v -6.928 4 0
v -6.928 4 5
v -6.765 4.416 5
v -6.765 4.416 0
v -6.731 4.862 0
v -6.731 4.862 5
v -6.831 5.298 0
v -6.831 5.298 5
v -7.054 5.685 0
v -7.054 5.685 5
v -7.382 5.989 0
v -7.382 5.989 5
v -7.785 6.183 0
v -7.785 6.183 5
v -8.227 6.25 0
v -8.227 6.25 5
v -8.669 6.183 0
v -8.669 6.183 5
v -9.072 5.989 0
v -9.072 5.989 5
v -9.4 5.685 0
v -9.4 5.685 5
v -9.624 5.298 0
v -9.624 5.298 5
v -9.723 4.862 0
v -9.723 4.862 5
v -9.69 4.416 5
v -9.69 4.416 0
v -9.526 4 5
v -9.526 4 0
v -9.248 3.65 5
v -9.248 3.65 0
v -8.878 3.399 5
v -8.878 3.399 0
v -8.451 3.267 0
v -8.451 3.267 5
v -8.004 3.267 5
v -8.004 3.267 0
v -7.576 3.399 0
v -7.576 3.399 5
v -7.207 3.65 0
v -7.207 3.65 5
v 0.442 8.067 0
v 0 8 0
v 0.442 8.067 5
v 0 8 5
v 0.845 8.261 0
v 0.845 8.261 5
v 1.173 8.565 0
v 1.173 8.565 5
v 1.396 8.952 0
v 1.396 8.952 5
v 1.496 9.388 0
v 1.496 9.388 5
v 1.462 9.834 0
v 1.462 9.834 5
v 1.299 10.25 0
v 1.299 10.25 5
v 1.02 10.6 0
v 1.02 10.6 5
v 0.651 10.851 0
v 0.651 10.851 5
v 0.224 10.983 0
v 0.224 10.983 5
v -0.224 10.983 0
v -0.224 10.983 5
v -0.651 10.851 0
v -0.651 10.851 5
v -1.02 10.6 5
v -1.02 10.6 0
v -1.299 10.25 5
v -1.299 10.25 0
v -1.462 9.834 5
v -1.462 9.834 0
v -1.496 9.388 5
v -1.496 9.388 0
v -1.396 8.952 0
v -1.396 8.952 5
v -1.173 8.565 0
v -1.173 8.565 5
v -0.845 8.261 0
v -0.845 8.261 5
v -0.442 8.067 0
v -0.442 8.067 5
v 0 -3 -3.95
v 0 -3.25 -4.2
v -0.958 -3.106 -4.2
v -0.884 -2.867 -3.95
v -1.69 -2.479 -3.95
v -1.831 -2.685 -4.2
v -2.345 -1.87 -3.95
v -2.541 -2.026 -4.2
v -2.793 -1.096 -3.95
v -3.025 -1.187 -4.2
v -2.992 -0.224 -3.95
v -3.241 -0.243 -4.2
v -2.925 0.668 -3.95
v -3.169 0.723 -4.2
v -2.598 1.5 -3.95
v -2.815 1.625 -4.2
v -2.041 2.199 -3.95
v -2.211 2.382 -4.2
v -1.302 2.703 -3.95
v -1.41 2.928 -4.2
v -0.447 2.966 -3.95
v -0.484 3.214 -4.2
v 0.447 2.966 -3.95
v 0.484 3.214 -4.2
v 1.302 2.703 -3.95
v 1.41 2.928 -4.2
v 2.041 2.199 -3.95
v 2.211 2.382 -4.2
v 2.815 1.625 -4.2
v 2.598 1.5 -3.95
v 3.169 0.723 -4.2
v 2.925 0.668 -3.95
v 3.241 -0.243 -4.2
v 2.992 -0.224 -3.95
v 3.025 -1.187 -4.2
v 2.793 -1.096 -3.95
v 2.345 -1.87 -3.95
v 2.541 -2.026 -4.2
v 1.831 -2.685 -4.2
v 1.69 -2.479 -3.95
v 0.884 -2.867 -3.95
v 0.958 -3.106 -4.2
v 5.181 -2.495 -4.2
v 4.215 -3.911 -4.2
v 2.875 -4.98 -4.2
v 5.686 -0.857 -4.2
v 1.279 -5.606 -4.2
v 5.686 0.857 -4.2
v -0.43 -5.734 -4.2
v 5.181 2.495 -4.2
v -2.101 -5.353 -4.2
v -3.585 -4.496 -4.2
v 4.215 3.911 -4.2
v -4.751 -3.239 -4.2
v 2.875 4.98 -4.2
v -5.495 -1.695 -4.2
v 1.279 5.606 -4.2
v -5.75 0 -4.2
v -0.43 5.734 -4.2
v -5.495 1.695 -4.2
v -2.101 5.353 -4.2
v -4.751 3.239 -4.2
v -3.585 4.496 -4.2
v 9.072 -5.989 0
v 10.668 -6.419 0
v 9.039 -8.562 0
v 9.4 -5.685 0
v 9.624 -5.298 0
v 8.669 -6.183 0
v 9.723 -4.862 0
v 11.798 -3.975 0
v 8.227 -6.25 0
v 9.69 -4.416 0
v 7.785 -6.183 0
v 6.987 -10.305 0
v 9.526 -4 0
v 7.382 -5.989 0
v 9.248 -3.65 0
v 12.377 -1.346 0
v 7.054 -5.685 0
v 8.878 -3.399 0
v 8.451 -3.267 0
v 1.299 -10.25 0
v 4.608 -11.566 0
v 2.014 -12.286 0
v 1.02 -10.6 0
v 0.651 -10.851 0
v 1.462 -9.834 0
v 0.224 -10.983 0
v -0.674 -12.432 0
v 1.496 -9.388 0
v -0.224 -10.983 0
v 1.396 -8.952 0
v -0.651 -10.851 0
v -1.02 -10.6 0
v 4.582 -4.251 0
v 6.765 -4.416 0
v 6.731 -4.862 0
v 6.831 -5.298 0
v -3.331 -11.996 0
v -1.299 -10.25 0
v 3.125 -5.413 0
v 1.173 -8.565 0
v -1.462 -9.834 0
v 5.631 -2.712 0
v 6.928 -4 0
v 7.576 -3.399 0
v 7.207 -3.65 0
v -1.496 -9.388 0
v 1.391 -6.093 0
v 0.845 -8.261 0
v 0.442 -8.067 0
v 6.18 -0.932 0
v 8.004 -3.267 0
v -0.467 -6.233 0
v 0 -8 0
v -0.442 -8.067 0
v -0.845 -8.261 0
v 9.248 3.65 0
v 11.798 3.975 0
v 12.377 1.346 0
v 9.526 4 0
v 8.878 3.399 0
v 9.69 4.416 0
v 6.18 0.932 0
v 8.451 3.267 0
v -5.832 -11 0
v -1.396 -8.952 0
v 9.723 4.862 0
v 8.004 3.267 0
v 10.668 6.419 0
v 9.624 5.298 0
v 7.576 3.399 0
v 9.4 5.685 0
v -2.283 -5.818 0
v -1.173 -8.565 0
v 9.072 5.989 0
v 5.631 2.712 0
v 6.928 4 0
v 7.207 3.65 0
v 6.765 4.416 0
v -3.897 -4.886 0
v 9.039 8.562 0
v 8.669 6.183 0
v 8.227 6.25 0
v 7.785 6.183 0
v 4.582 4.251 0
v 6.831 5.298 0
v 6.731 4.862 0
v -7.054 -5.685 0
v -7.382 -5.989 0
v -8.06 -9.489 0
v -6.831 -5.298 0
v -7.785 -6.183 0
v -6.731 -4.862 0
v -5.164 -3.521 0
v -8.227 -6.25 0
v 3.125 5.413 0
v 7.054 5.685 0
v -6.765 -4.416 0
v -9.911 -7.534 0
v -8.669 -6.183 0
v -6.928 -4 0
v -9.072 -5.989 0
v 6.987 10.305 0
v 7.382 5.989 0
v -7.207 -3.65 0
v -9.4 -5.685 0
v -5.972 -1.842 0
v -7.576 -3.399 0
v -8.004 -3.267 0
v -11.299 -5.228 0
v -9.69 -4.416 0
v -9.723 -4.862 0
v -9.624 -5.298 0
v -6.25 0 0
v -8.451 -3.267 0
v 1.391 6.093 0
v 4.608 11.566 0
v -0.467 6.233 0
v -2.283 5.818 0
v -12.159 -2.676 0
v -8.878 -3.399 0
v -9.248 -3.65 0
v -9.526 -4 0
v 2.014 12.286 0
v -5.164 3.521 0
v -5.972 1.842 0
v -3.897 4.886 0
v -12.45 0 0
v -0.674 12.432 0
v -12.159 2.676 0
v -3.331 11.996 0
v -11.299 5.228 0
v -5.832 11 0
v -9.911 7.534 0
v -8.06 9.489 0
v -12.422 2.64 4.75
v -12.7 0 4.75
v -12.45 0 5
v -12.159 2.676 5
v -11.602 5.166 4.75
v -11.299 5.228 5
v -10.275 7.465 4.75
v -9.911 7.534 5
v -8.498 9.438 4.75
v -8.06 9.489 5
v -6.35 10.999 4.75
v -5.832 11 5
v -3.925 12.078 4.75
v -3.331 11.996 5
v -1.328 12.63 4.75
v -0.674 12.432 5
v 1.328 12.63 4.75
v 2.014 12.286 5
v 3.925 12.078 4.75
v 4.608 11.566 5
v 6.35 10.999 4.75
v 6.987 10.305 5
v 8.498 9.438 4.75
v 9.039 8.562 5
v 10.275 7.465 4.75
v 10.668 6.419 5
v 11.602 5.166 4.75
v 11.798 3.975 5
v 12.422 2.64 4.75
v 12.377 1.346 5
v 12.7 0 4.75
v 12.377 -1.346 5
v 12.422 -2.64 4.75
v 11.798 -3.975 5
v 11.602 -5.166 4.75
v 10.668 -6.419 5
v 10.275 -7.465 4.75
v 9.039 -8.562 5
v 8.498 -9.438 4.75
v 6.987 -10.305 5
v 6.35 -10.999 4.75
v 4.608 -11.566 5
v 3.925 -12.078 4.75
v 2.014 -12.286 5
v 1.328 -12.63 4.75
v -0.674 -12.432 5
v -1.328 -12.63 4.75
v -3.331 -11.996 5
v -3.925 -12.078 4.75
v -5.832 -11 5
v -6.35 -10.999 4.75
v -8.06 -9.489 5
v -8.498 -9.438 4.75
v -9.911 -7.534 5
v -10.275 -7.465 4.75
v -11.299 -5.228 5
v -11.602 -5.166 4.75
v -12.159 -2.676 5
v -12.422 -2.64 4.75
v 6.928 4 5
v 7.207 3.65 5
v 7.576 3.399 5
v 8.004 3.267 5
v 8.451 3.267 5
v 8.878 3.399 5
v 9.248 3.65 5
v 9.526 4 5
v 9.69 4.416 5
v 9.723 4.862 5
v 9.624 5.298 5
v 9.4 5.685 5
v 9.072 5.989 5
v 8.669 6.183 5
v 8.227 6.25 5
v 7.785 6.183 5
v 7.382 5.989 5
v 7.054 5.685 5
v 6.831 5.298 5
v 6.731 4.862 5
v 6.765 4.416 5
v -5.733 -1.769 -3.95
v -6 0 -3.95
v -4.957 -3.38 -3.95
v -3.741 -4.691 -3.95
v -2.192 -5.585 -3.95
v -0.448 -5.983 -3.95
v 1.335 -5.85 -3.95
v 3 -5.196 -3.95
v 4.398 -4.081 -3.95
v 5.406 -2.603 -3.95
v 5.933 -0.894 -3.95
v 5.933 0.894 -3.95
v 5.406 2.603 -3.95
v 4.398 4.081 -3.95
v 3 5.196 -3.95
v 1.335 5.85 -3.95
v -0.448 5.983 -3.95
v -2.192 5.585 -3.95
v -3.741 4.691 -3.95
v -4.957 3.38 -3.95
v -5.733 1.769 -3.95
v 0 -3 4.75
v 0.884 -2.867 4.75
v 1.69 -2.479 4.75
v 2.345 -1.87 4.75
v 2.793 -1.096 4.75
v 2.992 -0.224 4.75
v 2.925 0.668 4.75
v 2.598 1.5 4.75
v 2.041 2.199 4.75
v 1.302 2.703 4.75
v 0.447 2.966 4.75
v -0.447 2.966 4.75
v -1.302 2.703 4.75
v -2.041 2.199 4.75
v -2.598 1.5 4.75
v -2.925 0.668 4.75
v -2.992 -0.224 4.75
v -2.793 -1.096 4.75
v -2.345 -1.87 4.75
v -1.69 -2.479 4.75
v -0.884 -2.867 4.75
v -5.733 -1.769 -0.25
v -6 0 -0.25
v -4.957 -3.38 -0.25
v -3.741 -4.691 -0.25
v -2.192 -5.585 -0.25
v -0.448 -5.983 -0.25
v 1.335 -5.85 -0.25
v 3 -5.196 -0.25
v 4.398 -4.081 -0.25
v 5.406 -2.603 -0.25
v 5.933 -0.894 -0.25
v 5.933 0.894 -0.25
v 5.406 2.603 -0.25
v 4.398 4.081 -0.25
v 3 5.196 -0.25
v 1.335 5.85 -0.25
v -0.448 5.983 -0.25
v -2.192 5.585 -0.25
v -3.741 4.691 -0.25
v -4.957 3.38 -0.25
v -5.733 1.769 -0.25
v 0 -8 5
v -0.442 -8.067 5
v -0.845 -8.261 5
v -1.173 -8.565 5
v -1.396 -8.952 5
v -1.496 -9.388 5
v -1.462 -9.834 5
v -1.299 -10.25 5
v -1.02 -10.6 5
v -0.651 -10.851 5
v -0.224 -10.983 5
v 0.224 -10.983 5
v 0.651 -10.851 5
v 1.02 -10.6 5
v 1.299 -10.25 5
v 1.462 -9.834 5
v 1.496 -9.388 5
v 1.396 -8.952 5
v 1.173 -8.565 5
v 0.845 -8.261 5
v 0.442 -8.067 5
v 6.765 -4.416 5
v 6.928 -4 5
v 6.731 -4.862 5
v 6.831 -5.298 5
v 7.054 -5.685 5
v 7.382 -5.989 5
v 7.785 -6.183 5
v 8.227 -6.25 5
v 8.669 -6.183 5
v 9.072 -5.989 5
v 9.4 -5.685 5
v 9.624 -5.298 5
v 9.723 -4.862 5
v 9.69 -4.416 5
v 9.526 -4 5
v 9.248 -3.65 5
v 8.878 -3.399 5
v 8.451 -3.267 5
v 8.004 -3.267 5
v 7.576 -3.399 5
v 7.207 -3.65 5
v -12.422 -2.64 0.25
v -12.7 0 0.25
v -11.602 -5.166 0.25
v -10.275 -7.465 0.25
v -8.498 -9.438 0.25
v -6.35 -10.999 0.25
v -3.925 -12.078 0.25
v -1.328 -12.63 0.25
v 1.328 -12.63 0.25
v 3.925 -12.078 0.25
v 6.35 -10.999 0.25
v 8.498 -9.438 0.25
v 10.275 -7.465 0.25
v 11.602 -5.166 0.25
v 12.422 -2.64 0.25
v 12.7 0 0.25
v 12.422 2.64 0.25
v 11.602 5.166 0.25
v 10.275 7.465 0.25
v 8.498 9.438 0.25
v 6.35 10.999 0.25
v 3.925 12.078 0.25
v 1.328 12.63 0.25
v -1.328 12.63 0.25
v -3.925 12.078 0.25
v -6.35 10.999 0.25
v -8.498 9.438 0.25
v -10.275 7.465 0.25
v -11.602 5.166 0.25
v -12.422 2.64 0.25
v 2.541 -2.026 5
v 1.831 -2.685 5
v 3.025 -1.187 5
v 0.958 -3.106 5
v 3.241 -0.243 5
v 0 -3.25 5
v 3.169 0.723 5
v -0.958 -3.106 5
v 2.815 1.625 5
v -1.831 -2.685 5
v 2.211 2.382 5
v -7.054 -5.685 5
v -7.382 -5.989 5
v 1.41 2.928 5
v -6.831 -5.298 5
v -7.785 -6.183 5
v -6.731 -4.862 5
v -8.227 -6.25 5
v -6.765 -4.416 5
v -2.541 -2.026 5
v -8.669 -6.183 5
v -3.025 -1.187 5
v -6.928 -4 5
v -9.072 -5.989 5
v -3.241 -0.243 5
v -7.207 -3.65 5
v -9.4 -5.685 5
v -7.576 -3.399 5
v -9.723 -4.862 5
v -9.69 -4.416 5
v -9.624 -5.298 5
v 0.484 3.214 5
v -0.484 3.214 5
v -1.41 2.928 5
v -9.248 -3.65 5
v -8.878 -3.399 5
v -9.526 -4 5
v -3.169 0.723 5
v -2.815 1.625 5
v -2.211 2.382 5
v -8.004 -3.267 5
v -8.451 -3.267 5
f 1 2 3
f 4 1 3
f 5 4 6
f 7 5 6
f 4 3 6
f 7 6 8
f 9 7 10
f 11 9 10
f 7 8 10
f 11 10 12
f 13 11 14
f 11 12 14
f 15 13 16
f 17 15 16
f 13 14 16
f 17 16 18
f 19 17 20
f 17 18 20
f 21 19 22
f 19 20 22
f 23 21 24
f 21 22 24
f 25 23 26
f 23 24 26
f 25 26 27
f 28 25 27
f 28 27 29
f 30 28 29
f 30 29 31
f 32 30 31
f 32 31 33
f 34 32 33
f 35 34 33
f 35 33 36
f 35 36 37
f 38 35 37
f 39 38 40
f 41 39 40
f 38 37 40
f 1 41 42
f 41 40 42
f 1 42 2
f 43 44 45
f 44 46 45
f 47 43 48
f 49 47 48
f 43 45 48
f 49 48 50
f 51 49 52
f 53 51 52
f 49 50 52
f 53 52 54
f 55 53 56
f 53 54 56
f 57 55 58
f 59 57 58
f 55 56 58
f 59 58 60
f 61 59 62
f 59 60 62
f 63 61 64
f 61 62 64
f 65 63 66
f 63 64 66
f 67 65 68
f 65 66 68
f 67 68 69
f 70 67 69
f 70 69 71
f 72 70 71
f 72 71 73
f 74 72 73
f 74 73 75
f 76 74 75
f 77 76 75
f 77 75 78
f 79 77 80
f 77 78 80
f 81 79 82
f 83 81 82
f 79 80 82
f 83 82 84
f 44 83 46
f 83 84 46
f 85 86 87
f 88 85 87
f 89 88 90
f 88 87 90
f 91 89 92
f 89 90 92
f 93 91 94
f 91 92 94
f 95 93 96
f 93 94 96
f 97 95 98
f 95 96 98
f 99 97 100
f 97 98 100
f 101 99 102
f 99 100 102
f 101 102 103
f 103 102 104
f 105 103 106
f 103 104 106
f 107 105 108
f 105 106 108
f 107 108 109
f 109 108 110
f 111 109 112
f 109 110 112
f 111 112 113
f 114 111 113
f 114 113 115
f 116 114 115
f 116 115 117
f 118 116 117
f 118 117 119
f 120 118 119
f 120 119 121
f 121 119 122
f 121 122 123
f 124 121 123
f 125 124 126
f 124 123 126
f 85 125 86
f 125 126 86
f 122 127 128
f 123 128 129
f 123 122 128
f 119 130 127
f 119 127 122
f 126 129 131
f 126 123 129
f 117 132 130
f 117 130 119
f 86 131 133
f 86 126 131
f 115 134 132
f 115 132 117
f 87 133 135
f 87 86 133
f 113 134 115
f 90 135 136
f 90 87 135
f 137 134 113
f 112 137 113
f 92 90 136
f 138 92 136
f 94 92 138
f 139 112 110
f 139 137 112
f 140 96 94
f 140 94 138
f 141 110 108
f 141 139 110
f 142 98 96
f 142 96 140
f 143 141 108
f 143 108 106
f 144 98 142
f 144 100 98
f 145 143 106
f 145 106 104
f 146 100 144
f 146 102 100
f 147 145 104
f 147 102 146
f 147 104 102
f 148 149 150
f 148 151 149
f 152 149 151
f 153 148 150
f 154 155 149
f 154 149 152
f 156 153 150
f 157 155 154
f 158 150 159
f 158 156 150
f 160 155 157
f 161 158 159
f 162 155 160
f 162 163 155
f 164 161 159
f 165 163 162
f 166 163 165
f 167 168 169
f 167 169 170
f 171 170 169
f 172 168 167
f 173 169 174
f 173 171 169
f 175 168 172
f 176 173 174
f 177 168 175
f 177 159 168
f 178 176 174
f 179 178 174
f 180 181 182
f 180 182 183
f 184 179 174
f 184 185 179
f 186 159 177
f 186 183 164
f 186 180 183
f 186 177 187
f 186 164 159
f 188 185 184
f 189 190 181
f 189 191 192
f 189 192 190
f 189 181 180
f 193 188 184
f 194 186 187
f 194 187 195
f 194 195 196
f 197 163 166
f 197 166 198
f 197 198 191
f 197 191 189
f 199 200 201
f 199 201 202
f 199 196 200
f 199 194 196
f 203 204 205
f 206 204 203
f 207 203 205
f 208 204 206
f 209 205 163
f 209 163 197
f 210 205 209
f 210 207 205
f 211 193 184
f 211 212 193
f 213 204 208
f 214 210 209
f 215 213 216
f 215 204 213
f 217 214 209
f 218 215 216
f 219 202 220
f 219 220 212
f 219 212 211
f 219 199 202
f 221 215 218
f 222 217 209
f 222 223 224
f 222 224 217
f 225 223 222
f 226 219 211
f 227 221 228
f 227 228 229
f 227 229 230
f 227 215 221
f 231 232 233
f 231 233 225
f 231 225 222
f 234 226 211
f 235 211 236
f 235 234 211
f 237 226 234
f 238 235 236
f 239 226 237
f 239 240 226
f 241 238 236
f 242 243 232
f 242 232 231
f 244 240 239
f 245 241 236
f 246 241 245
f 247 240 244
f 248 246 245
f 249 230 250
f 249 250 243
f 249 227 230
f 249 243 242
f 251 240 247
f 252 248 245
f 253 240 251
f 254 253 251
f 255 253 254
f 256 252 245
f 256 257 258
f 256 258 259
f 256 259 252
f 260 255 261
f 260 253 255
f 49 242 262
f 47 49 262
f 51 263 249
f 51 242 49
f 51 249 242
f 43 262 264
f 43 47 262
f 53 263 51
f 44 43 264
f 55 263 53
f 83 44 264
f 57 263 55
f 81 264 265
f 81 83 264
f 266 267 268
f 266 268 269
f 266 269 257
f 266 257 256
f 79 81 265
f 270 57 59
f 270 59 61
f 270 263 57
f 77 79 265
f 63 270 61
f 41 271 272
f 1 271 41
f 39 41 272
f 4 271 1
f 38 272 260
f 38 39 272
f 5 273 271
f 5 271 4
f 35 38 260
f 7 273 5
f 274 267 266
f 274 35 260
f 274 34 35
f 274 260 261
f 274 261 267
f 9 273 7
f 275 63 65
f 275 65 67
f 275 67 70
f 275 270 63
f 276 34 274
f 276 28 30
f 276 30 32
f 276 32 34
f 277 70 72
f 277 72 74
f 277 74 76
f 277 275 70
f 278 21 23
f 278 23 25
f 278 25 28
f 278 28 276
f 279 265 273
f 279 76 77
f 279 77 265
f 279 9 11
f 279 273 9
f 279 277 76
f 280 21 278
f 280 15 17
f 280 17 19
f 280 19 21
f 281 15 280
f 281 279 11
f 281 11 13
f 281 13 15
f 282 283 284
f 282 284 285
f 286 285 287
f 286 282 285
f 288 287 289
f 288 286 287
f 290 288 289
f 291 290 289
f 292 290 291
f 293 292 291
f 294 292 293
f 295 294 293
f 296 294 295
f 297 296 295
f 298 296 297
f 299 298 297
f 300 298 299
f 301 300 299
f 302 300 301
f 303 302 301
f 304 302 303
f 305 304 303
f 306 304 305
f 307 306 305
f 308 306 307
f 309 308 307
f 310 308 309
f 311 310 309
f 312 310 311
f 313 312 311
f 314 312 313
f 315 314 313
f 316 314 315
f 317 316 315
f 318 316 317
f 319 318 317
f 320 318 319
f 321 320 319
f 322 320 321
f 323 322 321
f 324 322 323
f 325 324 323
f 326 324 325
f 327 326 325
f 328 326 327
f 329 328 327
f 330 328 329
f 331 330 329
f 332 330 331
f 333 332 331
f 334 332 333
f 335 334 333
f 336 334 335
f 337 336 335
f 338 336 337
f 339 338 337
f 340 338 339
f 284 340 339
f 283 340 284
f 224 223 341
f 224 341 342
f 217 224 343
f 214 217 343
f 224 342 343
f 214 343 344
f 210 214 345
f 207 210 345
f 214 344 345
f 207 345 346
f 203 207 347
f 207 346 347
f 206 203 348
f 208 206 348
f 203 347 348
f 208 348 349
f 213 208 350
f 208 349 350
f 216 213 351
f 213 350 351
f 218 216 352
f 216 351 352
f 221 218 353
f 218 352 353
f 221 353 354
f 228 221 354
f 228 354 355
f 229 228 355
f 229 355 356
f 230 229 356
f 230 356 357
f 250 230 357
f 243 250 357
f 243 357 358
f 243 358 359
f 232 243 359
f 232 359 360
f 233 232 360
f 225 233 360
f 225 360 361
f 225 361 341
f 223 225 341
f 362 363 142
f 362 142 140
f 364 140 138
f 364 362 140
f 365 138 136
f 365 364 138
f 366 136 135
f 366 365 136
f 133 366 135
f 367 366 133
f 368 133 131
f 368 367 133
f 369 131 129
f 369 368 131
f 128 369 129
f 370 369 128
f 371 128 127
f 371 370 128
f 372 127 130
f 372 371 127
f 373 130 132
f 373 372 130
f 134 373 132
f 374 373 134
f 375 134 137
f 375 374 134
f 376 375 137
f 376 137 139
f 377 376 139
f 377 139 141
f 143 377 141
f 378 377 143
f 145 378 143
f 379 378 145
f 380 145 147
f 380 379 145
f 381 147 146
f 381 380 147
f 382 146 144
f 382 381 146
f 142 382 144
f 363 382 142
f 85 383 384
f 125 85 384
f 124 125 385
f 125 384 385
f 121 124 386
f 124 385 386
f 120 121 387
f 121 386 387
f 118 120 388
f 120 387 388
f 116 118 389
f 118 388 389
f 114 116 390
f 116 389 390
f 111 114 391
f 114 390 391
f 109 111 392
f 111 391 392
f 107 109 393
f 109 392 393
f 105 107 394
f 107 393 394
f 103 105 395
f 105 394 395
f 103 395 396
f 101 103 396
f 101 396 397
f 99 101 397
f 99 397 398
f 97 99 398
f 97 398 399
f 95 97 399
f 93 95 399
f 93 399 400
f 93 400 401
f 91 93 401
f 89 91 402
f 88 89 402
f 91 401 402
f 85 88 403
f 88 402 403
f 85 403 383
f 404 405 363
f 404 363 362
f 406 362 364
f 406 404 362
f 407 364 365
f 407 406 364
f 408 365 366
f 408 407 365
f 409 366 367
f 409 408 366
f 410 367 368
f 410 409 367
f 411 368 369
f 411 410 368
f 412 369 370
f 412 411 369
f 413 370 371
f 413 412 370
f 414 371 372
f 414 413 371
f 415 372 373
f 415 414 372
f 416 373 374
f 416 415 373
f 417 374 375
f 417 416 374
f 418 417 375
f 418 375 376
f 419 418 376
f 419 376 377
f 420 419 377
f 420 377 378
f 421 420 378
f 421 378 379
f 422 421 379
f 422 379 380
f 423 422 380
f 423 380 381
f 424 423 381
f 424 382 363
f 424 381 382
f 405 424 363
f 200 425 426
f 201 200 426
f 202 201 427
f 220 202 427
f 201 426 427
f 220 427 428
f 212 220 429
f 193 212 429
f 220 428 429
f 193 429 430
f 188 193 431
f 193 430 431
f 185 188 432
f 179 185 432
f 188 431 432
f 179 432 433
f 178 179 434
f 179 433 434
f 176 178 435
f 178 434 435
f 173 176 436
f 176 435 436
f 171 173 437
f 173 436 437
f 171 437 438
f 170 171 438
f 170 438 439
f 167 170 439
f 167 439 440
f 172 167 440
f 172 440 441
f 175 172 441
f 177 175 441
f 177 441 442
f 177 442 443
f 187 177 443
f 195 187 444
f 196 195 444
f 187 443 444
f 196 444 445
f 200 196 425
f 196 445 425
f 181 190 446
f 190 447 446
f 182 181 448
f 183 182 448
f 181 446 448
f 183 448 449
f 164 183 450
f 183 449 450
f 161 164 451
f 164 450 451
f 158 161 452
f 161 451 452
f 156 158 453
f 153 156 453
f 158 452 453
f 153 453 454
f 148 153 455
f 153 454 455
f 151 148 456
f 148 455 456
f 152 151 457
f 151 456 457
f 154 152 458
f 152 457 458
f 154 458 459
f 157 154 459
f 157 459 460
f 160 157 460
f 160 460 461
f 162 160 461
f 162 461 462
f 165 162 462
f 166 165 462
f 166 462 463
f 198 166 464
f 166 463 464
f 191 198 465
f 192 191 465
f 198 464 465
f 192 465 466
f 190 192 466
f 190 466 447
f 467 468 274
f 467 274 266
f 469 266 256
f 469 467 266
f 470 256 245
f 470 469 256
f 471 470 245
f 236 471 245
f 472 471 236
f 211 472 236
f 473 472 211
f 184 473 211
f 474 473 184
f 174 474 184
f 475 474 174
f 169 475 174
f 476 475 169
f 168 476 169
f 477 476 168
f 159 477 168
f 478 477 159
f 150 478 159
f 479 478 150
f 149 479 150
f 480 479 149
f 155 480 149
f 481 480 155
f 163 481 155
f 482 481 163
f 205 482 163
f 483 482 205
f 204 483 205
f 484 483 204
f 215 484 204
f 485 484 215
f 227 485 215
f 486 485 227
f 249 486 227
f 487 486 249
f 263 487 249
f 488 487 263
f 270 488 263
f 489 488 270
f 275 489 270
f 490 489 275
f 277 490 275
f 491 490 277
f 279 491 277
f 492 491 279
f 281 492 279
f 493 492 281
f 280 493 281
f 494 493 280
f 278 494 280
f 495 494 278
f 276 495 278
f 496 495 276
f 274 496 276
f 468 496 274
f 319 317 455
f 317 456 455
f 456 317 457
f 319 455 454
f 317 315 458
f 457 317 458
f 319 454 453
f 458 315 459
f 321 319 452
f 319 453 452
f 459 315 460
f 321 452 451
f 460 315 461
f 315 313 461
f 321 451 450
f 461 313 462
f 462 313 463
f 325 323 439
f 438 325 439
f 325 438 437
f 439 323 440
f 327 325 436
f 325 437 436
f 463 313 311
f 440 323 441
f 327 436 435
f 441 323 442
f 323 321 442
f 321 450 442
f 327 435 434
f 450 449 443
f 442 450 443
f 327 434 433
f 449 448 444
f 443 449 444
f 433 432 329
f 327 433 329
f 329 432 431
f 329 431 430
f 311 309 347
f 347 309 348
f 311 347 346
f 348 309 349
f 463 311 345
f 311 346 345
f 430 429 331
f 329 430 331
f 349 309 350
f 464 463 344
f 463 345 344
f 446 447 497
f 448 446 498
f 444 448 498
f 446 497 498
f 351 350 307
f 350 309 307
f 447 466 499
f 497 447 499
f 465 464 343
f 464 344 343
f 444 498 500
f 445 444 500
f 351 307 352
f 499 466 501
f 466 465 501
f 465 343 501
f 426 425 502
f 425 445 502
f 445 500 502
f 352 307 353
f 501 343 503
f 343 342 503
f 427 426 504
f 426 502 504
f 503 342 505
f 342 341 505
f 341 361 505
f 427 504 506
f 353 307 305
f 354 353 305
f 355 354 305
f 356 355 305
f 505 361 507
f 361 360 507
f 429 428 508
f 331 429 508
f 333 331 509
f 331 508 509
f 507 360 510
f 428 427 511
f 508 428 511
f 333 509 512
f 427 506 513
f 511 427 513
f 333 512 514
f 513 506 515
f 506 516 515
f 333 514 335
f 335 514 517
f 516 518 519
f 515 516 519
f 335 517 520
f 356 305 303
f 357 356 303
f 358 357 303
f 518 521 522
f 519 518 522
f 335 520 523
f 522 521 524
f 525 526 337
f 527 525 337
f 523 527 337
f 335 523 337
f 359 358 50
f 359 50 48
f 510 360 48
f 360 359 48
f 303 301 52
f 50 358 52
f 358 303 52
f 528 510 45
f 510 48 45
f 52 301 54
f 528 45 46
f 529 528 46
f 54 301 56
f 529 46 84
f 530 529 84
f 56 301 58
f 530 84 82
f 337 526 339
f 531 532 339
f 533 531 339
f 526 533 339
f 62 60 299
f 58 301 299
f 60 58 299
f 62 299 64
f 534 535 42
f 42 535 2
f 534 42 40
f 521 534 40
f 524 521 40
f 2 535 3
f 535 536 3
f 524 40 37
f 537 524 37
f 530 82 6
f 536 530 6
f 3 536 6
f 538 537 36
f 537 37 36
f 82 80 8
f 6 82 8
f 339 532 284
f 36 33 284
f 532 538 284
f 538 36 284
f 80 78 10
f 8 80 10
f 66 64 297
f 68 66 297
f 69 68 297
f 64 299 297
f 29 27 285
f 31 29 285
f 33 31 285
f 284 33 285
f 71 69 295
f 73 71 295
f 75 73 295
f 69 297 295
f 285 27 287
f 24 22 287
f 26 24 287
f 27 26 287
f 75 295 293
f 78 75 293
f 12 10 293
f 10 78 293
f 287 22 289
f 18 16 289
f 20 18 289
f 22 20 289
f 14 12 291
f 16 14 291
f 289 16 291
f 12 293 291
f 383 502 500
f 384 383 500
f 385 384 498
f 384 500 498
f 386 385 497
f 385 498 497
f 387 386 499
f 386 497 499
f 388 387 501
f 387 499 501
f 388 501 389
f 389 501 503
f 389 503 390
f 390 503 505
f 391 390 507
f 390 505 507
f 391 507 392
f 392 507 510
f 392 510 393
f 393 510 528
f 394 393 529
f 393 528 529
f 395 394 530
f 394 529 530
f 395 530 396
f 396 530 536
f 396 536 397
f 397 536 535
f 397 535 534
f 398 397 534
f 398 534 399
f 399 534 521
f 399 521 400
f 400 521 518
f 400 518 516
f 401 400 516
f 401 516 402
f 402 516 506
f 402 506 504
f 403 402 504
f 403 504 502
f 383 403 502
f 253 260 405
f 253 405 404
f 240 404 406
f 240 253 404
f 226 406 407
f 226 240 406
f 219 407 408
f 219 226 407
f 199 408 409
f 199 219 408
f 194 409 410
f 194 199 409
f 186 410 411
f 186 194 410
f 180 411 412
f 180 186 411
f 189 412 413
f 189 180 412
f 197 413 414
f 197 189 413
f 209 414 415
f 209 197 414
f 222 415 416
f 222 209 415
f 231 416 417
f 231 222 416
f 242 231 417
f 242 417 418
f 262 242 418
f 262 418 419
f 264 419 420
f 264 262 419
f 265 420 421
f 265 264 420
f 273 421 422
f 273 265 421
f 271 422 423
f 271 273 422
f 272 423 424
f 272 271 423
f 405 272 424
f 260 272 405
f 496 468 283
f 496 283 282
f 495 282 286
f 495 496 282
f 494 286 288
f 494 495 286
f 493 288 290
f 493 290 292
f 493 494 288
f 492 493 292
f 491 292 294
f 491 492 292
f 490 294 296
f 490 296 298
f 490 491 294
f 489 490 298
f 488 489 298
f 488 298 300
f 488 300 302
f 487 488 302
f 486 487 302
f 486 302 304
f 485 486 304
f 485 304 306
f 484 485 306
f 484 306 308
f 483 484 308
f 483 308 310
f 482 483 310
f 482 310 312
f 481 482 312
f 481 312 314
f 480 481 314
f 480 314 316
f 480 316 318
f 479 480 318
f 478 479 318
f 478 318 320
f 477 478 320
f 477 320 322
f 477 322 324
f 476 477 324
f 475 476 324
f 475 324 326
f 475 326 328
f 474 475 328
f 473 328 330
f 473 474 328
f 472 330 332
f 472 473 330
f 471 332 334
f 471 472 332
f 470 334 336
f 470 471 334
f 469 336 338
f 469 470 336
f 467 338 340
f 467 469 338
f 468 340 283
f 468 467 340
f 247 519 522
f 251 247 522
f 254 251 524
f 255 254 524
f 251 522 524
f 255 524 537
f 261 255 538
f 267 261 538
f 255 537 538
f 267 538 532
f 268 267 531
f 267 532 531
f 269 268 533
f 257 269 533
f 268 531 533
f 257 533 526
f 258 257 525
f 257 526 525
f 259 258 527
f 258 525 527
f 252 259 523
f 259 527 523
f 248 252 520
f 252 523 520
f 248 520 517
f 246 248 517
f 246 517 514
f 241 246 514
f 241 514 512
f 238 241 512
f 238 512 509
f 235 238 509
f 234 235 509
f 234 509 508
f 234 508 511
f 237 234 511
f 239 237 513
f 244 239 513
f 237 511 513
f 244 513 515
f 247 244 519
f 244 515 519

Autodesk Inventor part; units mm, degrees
ref_plane "YZ Plane" through (0, 0, 0) normal (1, 0, 0) x (0, 1, 0)
ref_plane "XZ Plane" through (0, 0, 0) normal (0, 1, 0) x (-1, 0, 0)
ref_plane "XY Plane" through (0, 0, 0) normal (0, 0, 1) x (1, 0, 0)
sketch "Szkic1" plane through (0, 0, 0) normal (0, 0, 1) x (1, 0, 0)
  circle A0 centre (0, 0) radius 12.7
  dimension "d0" = 25.4
extrude "Wyciągnięcie proste1" add sketch "Szkic1" along normal blind 4.2 and the other way blind 5
sketch "Szkic2" plane through (0, 0, 0) normal (0, 0, 1) x (1, 0, 0)
  circle A0 centre (0, 0) radius 6
  circle A1 centre (0, 0) radius 12.7 projected
  dimension "d5" = 12
extrude "Wyciągnięcie proste2" cut sketch "Szkic2" along normal blind 4.2
hole "Otwór1" at (0, 0, 4.2) direction (0, 0, -1) diameter 6 end through all
sketch "Szkic3" plane through (0, 0, 0) normal (0, 0, 1) x (1, 0, 0)
  line L0 (0, 0) -> (0, 9.5) construction
  dimension "d18" = 9.5
hole "Otwór2" at (0, 9.5, 0) direction (0, 0, -1) diameter 3 end through all
pattern_circular "Szyk kołowy1" count 6 over 360 about axis through (0, 0, -32.8805) along (0, 0, 1) of "Otwór2"
chamfer "Faza1" distance 0.25 angle 45 6 edges at (-6, 0, 4.2) (-12.7, 0, 0) (-12.7, 0, -5) (-6, 0, 0) (0, 3, -5) (0, 3, 4.2)
move or copy body "Przesuń bryłę1" bodies to move or copy 1 copy no rotation origin (0, 0, 0) rotation axis (0, 1, 0) rotation angle 180
properties part number "bepf_kolo_adapter_walu_fi6" material "Aluminium 6061"
